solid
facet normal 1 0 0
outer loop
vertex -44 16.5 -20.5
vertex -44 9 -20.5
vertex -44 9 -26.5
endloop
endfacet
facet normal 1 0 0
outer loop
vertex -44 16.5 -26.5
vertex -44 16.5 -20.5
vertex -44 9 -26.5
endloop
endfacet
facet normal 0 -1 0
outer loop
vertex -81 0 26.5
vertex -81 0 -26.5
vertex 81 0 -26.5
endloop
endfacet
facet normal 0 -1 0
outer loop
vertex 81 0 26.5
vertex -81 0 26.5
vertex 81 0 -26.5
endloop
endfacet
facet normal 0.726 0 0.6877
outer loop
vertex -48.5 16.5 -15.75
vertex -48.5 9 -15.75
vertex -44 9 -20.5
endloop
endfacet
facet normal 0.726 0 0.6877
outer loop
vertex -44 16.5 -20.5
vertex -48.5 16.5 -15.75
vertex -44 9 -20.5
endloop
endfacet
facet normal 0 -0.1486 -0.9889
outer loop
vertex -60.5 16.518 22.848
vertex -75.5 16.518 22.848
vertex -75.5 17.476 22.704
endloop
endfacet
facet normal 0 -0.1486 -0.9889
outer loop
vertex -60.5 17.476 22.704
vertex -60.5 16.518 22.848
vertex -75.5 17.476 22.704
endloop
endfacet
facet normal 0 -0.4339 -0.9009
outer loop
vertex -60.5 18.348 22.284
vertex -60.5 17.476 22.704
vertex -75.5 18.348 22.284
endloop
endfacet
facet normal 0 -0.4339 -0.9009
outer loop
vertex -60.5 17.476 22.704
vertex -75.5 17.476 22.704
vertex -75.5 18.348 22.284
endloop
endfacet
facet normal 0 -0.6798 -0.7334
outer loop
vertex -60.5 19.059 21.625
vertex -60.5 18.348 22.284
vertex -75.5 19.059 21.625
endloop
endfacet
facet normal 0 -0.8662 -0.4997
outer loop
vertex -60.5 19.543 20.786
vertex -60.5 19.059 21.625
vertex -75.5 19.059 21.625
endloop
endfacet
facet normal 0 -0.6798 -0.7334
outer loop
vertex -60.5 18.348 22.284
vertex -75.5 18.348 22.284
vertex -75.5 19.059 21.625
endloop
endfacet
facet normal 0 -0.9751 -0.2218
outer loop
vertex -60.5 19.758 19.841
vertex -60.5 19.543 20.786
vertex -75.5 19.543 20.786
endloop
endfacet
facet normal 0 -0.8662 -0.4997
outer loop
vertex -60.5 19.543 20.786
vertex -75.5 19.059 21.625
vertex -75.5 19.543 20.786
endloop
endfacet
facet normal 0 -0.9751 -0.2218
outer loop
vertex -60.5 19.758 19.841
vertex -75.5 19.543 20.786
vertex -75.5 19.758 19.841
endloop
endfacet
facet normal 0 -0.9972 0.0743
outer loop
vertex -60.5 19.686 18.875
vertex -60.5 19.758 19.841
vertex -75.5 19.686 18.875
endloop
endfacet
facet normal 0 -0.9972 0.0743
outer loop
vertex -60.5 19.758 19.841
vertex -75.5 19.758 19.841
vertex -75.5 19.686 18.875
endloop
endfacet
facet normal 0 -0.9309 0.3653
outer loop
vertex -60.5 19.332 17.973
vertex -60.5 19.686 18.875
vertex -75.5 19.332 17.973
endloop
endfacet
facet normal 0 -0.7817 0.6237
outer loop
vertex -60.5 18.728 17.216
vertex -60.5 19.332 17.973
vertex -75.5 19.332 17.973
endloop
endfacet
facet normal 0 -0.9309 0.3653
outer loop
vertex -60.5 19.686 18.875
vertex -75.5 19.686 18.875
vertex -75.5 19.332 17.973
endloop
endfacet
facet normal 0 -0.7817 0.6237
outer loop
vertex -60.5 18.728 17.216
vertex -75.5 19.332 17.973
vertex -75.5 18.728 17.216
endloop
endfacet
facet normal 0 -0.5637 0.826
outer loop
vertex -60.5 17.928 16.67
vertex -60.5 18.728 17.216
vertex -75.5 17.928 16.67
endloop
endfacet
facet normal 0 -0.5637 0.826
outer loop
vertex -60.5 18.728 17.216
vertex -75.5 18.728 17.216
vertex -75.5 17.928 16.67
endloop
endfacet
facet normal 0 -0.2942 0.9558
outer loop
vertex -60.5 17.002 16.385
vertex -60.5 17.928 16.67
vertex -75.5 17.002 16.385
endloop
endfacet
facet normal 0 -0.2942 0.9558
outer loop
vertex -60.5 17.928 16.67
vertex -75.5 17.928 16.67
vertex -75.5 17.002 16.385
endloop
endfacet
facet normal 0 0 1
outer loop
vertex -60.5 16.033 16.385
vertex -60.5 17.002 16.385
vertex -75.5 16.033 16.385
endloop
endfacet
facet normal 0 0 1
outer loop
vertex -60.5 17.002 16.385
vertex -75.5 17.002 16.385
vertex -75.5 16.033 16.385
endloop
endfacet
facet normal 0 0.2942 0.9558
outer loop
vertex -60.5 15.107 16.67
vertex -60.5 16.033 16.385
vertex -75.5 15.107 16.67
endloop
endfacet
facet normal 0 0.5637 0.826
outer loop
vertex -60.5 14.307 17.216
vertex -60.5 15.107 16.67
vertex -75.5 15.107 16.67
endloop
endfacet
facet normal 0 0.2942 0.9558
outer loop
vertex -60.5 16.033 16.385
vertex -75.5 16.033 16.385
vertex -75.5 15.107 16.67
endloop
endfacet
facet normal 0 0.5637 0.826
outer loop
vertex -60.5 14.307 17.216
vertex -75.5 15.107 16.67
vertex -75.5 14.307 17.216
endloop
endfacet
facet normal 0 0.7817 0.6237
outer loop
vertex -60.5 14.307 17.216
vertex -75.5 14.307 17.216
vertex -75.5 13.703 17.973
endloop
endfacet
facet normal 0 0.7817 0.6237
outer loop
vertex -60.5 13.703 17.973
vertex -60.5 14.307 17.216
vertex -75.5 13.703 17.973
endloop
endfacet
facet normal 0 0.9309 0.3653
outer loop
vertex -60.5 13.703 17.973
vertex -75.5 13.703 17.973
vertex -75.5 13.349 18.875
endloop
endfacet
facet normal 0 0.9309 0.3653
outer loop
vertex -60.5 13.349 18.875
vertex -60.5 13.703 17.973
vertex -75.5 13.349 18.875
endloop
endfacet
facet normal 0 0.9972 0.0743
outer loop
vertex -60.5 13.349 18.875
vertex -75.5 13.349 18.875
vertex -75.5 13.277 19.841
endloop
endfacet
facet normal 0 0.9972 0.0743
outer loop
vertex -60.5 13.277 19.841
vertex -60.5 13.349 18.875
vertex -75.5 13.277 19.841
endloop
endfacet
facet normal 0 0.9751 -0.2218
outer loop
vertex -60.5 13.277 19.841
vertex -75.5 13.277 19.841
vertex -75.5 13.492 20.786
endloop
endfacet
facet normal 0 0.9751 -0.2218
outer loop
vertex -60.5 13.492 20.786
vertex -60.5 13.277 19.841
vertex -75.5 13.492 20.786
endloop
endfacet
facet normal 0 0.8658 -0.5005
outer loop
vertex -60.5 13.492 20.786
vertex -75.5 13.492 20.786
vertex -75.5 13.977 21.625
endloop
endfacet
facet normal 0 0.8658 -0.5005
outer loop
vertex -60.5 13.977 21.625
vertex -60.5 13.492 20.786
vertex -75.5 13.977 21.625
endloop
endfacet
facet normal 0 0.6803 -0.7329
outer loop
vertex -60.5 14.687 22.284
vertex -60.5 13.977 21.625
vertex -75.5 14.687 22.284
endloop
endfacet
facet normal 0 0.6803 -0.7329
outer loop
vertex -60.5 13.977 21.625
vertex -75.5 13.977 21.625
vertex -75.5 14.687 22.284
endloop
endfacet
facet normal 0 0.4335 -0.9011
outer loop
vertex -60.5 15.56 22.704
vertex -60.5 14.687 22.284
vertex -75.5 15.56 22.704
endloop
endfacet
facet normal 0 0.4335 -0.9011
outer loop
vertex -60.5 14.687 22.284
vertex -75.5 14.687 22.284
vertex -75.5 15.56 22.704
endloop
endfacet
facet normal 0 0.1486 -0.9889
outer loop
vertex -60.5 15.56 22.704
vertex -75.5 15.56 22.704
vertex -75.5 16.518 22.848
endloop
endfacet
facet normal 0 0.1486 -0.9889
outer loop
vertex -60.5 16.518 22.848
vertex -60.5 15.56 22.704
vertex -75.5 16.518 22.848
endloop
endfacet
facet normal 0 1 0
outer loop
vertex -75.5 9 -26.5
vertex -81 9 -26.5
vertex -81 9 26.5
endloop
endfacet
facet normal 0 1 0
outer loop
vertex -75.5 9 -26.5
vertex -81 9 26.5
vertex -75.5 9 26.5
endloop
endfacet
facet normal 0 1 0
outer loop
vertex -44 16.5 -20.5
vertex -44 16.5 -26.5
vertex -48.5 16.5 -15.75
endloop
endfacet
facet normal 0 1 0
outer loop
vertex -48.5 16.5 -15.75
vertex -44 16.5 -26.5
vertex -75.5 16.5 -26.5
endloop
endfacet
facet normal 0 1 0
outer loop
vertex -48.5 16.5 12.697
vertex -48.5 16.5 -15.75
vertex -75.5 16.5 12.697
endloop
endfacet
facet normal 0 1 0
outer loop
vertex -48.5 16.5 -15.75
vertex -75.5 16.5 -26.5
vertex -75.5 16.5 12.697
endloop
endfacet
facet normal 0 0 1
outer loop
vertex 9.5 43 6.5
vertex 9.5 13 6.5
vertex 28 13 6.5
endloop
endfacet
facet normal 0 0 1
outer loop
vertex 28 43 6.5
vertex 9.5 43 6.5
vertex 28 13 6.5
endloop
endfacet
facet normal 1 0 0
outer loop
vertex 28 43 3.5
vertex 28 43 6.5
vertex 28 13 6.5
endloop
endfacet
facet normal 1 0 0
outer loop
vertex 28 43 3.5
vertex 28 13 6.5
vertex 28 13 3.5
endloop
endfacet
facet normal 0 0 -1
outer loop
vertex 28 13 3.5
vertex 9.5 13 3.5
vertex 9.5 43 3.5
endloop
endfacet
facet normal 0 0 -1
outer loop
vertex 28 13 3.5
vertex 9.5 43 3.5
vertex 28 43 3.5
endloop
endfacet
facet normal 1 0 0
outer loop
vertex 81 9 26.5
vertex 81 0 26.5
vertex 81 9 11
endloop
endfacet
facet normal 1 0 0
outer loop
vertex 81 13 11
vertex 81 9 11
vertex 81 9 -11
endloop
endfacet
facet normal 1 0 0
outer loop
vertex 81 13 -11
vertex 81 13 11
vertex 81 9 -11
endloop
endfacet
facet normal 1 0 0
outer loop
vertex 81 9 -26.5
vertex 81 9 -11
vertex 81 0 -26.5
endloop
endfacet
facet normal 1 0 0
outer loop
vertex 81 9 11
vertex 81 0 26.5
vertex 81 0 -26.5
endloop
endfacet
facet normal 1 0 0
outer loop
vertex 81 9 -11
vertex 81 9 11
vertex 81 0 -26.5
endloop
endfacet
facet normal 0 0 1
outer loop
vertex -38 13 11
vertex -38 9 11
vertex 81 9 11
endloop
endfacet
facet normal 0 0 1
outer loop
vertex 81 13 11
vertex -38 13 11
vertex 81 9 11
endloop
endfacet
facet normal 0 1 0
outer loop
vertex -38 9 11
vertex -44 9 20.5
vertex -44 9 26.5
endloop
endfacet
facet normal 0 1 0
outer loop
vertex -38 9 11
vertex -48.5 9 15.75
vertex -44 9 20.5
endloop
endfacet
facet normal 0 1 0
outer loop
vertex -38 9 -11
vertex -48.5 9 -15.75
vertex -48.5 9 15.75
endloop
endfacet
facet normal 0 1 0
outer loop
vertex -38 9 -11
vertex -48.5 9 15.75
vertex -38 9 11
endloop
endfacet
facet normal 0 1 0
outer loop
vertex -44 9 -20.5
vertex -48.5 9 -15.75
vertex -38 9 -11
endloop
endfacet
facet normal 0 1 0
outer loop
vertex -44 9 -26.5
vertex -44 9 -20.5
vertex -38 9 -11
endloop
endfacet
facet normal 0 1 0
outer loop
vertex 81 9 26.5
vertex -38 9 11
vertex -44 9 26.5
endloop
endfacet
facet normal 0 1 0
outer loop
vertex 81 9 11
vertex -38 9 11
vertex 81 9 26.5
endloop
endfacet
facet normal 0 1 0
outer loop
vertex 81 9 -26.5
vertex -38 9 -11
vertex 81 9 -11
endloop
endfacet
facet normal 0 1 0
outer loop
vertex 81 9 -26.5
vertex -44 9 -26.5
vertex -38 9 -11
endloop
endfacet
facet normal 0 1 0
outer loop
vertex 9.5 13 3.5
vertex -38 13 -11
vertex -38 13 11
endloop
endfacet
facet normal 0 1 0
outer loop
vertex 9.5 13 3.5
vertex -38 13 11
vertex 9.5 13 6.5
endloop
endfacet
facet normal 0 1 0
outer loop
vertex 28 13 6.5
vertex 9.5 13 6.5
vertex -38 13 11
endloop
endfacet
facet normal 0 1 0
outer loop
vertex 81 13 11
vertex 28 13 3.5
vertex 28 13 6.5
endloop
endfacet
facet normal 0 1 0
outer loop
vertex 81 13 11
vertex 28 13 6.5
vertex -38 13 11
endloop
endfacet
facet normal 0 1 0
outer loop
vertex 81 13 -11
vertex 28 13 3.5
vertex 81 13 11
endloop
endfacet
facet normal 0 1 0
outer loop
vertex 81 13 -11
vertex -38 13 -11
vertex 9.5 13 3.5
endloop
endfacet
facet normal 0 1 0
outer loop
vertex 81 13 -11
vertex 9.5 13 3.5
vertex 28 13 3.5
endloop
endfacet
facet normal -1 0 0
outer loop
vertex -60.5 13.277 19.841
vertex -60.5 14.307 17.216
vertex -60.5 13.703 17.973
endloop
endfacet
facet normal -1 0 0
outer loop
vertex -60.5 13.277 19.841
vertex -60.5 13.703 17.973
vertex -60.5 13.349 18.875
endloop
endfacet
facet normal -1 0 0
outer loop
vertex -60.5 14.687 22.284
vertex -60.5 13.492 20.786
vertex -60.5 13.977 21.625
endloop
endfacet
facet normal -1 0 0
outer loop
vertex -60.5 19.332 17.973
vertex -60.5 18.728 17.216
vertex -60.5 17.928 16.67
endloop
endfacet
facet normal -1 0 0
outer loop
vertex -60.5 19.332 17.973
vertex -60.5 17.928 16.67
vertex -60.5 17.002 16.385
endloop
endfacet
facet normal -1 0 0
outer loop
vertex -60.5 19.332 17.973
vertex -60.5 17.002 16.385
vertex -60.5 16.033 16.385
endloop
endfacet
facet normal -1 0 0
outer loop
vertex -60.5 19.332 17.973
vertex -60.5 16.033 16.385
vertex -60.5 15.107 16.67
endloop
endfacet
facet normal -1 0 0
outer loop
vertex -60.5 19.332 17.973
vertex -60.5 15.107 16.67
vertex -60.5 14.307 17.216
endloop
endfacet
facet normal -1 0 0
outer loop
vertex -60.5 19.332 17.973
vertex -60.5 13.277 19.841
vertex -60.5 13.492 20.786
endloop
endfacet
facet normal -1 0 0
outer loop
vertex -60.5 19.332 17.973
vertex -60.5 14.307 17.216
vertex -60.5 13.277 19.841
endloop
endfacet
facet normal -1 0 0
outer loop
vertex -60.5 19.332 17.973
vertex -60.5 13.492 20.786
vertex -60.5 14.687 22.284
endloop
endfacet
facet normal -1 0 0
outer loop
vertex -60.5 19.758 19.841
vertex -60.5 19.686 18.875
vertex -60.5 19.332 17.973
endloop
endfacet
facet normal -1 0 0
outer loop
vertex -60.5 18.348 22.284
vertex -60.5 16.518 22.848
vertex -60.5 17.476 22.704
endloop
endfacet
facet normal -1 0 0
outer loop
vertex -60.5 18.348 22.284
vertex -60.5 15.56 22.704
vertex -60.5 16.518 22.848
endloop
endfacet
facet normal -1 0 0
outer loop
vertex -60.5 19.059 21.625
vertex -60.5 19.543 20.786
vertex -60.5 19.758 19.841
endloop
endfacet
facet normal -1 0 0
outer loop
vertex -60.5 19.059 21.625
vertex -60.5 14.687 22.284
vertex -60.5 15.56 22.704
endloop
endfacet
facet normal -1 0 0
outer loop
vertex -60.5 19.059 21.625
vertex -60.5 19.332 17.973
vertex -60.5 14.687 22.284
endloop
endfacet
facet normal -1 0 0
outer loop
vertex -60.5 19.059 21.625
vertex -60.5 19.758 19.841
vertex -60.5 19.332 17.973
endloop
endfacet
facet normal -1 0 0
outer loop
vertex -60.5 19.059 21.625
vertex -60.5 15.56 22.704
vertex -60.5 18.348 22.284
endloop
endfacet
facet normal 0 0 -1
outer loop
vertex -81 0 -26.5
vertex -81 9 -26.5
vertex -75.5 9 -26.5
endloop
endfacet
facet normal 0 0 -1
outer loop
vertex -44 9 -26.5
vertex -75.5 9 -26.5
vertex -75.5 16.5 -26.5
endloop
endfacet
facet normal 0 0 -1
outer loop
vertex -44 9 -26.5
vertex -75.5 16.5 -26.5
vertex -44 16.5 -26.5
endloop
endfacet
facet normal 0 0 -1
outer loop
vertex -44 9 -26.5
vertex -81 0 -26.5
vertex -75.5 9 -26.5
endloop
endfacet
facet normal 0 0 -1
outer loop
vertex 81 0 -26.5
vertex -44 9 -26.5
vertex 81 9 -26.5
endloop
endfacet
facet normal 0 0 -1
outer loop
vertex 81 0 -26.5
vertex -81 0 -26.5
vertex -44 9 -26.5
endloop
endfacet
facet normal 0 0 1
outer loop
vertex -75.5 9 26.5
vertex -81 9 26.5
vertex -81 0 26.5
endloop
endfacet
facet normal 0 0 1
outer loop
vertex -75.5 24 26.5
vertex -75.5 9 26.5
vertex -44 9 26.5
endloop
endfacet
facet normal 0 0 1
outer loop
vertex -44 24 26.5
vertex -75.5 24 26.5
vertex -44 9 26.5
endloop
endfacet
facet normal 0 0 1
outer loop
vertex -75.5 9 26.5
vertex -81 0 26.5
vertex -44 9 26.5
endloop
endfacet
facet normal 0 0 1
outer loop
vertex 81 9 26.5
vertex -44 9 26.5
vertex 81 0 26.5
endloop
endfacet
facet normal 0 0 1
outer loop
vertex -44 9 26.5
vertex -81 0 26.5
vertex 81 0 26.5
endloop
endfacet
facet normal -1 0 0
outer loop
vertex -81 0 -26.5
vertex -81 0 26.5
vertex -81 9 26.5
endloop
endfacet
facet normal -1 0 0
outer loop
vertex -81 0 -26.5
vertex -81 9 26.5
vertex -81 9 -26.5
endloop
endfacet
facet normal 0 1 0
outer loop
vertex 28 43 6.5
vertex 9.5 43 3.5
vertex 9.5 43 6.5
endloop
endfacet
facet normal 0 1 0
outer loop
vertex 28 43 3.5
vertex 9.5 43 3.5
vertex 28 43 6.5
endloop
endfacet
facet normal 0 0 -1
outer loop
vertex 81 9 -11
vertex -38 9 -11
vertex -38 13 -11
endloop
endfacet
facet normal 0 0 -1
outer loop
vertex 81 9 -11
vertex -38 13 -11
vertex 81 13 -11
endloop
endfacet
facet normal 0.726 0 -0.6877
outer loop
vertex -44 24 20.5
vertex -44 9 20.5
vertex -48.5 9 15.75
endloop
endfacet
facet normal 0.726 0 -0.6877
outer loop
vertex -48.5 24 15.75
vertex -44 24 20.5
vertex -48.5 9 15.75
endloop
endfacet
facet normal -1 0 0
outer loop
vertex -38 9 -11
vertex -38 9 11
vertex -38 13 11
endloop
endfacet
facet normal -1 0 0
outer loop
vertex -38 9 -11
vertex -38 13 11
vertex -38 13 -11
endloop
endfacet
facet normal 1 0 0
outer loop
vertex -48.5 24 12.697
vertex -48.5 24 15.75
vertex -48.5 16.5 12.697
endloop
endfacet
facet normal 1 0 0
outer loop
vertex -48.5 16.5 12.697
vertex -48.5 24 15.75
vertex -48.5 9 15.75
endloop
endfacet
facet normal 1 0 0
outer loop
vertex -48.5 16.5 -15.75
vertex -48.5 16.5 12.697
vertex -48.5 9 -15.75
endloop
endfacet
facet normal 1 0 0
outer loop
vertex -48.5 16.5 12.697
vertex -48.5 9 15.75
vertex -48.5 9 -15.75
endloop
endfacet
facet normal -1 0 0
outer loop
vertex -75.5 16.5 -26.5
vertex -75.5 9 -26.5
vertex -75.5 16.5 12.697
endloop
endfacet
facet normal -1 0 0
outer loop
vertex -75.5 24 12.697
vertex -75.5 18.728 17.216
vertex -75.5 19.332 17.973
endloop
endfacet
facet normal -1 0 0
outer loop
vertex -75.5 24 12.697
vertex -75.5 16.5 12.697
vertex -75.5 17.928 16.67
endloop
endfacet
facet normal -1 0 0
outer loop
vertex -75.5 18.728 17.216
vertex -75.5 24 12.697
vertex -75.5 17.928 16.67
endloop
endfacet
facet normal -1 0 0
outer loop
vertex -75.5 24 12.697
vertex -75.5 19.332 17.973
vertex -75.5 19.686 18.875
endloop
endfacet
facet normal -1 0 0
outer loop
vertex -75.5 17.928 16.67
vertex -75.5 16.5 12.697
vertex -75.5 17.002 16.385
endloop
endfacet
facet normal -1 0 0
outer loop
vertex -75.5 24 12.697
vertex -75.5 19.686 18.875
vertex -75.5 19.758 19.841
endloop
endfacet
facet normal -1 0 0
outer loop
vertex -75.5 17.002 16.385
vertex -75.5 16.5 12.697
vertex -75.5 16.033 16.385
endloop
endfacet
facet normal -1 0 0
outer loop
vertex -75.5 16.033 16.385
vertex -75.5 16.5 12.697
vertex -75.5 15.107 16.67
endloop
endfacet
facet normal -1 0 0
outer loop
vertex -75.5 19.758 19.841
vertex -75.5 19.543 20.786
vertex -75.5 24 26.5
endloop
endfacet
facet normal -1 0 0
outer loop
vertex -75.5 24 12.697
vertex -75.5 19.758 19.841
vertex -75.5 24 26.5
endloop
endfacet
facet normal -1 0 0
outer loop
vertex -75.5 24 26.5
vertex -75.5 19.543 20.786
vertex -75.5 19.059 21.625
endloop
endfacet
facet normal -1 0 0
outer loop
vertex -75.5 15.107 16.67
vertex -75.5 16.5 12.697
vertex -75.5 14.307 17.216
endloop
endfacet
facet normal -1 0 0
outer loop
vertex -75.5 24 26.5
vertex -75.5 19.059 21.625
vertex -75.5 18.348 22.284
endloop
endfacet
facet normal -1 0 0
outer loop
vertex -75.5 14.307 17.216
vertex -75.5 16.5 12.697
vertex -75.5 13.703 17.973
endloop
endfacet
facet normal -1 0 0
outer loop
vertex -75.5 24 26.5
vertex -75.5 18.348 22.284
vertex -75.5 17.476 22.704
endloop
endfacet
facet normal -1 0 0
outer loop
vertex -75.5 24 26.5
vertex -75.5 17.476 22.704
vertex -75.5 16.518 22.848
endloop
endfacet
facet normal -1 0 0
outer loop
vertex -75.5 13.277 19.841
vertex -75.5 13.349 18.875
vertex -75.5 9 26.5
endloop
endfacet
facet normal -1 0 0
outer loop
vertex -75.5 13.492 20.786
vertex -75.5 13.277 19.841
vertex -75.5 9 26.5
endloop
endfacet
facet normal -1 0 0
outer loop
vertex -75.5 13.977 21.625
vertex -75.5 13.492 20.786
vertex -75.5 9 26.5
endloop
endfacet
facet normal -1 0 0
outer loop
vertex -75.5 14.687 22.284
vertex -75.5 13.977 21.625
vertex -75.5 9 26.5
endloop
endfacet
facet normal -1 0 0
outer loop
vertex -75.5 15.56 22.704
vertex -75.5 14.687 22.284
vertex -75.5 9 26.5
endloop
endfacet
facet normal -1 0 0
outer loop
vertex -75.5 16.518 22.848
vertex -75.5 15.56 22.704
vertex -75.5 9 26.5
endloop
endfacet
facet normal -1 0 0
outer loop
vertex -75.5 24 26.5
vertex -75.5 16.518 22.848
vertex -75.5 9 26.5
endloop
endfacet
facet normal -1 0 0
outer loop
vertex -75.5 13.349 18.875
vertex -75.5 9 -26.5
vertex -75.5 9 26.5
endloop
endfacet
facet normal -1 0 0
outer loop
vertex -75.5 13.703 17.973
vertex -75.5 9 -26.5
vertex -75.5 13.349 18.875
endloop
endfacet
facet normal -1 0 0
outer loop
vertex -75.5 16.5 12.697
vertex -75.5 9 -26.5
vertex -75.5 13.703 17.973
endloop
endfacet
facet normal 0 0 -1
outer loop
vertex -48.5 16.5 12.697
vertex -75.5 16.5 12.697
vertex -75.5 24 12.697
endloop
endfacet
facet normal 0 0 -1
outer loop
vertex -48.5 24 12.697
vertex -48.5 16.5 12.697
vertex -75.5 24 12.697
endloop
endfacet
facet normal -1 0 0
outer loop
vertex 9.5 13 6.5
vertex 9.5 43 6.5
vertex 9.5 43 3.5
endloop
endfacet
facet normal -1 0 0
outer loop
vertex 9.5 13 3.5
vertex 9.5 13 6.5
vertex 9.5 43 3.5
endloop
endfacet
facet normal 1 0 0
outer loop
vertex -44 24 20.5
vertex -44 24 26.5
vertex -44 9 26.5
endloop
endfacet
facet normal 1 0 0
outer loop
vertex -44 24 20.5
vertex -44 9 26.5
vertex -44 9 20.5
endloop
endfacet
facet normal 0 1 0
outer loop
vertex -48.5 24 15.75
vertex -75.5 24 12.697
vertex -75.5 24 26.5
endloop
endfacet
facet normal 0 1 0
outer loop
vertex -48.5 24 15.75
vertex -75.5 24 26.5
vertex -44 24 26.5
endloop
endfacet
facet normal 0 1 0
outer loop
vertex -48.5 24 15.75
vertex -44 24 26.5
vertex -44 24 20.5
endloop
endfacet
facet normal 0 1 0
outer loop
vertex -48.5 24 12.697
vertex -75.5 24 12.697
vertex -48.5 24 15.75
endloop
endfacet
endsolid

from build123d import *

# Parameters (mm, degrees)
SKETCH_1_W          = 162
SKETCH_1_H          = 53
EXTRUDE_1_DEPTH     = 9
EXTRUDE_2_DEPTH     = 15
SKETCH_5_W          = 39.196939595
SKETCH_5_H          = 7.5
CUT_EXTRUDE_1_DEPTH = 157.5
SKETCH_6_R          = 3.25
CUT_EXTRUDE_2_DEPTH = 15
SKETCH_7_W          = 119
SKETCH_7_H          = 22
EXTRUDE_3_DEPTH     = 4
SKETCH_8_W          = 18.5
SKETCH_8_H          = 3
EXTRUDE_4_DEPTH     = 30


with BuildPart() as part:
    # 草图1 → 凸台-拉伸1 (new body)
    with BuildSketch(Plane(origin=(0, 0, 0), x_dir=(1, 0, 0), z_dir=(0, 1, 0))):
        Rectangle(SKETCH_1_W, SKETCH_1_H)
    extrude(amount=EXTRUDE_1_DEPTH)

    # 草图2 → 凸台-拉伸2 (add)
    with BuildSketch(Plane(origin=(0, 9, 0), x_dir=(1, 0, 0), z_dir=(0, 1, 0))):
        Polygon((-75.5, 26.5), (-75.5, -26.5), (-44, -26.5), (-44, -20.5), (-48.5, -15.75), (-48.5, 15.75), (-44, 20.5), (-44, 26.5), align=None)
    extrude(amount=EXTRUDE_2_DEPTH)

    # 草图5 → 切除-拉伸1 (cut, through all)
    with BuildSketch(Plane.ZY.offset(75.5)):
        with Locations((-6.901530203, 20.25)):
            Rectangle(SKETCH_5_W, SKETCH_5_H)
    extrude(amount=-CUT_EXTRUDE_1_DEPTH, mode=Mode.SUBTRACT)

    # 草图6 → 切除-拉伸2 (cut)
    with BuildSketch(Plane.ZY.offset(75.5)):
        with Locations((19.598469797, 16.517563147)):
            Circle(SKETCH_6_R)
    extrude(amount=-CUT_EXTRUDE_2_DEPTH, mode=Mode.SUBTRACT)

    # 草图7 → 凸台-拉伸3 (add)
    with BuildSketch(Plane(origin=(0, 9, 0), x_dir=(1, 0, 0), z_dir=(0, 1, 0))):
        with Locations((21.5, 0)):
            Rectangle(SKETCH_7_W, SKETCH_7_H)
    extrude(amount=EXTRUDE_3_DEPTH)

    # 草图8 → 凸台-拉伸4 (add)
    with BuildSketch(Plane(origin=(0, 13, 0), x_dir=(1, 0, 0), z_dir=(0, 1, 0))):
        with Locations((18.75, -5)):
            Rectangle(SKETCH_8_W, SKETCH_8_H)
    extrude(amount=EXTRUDE_4_DEPTH)


solid = part.part
